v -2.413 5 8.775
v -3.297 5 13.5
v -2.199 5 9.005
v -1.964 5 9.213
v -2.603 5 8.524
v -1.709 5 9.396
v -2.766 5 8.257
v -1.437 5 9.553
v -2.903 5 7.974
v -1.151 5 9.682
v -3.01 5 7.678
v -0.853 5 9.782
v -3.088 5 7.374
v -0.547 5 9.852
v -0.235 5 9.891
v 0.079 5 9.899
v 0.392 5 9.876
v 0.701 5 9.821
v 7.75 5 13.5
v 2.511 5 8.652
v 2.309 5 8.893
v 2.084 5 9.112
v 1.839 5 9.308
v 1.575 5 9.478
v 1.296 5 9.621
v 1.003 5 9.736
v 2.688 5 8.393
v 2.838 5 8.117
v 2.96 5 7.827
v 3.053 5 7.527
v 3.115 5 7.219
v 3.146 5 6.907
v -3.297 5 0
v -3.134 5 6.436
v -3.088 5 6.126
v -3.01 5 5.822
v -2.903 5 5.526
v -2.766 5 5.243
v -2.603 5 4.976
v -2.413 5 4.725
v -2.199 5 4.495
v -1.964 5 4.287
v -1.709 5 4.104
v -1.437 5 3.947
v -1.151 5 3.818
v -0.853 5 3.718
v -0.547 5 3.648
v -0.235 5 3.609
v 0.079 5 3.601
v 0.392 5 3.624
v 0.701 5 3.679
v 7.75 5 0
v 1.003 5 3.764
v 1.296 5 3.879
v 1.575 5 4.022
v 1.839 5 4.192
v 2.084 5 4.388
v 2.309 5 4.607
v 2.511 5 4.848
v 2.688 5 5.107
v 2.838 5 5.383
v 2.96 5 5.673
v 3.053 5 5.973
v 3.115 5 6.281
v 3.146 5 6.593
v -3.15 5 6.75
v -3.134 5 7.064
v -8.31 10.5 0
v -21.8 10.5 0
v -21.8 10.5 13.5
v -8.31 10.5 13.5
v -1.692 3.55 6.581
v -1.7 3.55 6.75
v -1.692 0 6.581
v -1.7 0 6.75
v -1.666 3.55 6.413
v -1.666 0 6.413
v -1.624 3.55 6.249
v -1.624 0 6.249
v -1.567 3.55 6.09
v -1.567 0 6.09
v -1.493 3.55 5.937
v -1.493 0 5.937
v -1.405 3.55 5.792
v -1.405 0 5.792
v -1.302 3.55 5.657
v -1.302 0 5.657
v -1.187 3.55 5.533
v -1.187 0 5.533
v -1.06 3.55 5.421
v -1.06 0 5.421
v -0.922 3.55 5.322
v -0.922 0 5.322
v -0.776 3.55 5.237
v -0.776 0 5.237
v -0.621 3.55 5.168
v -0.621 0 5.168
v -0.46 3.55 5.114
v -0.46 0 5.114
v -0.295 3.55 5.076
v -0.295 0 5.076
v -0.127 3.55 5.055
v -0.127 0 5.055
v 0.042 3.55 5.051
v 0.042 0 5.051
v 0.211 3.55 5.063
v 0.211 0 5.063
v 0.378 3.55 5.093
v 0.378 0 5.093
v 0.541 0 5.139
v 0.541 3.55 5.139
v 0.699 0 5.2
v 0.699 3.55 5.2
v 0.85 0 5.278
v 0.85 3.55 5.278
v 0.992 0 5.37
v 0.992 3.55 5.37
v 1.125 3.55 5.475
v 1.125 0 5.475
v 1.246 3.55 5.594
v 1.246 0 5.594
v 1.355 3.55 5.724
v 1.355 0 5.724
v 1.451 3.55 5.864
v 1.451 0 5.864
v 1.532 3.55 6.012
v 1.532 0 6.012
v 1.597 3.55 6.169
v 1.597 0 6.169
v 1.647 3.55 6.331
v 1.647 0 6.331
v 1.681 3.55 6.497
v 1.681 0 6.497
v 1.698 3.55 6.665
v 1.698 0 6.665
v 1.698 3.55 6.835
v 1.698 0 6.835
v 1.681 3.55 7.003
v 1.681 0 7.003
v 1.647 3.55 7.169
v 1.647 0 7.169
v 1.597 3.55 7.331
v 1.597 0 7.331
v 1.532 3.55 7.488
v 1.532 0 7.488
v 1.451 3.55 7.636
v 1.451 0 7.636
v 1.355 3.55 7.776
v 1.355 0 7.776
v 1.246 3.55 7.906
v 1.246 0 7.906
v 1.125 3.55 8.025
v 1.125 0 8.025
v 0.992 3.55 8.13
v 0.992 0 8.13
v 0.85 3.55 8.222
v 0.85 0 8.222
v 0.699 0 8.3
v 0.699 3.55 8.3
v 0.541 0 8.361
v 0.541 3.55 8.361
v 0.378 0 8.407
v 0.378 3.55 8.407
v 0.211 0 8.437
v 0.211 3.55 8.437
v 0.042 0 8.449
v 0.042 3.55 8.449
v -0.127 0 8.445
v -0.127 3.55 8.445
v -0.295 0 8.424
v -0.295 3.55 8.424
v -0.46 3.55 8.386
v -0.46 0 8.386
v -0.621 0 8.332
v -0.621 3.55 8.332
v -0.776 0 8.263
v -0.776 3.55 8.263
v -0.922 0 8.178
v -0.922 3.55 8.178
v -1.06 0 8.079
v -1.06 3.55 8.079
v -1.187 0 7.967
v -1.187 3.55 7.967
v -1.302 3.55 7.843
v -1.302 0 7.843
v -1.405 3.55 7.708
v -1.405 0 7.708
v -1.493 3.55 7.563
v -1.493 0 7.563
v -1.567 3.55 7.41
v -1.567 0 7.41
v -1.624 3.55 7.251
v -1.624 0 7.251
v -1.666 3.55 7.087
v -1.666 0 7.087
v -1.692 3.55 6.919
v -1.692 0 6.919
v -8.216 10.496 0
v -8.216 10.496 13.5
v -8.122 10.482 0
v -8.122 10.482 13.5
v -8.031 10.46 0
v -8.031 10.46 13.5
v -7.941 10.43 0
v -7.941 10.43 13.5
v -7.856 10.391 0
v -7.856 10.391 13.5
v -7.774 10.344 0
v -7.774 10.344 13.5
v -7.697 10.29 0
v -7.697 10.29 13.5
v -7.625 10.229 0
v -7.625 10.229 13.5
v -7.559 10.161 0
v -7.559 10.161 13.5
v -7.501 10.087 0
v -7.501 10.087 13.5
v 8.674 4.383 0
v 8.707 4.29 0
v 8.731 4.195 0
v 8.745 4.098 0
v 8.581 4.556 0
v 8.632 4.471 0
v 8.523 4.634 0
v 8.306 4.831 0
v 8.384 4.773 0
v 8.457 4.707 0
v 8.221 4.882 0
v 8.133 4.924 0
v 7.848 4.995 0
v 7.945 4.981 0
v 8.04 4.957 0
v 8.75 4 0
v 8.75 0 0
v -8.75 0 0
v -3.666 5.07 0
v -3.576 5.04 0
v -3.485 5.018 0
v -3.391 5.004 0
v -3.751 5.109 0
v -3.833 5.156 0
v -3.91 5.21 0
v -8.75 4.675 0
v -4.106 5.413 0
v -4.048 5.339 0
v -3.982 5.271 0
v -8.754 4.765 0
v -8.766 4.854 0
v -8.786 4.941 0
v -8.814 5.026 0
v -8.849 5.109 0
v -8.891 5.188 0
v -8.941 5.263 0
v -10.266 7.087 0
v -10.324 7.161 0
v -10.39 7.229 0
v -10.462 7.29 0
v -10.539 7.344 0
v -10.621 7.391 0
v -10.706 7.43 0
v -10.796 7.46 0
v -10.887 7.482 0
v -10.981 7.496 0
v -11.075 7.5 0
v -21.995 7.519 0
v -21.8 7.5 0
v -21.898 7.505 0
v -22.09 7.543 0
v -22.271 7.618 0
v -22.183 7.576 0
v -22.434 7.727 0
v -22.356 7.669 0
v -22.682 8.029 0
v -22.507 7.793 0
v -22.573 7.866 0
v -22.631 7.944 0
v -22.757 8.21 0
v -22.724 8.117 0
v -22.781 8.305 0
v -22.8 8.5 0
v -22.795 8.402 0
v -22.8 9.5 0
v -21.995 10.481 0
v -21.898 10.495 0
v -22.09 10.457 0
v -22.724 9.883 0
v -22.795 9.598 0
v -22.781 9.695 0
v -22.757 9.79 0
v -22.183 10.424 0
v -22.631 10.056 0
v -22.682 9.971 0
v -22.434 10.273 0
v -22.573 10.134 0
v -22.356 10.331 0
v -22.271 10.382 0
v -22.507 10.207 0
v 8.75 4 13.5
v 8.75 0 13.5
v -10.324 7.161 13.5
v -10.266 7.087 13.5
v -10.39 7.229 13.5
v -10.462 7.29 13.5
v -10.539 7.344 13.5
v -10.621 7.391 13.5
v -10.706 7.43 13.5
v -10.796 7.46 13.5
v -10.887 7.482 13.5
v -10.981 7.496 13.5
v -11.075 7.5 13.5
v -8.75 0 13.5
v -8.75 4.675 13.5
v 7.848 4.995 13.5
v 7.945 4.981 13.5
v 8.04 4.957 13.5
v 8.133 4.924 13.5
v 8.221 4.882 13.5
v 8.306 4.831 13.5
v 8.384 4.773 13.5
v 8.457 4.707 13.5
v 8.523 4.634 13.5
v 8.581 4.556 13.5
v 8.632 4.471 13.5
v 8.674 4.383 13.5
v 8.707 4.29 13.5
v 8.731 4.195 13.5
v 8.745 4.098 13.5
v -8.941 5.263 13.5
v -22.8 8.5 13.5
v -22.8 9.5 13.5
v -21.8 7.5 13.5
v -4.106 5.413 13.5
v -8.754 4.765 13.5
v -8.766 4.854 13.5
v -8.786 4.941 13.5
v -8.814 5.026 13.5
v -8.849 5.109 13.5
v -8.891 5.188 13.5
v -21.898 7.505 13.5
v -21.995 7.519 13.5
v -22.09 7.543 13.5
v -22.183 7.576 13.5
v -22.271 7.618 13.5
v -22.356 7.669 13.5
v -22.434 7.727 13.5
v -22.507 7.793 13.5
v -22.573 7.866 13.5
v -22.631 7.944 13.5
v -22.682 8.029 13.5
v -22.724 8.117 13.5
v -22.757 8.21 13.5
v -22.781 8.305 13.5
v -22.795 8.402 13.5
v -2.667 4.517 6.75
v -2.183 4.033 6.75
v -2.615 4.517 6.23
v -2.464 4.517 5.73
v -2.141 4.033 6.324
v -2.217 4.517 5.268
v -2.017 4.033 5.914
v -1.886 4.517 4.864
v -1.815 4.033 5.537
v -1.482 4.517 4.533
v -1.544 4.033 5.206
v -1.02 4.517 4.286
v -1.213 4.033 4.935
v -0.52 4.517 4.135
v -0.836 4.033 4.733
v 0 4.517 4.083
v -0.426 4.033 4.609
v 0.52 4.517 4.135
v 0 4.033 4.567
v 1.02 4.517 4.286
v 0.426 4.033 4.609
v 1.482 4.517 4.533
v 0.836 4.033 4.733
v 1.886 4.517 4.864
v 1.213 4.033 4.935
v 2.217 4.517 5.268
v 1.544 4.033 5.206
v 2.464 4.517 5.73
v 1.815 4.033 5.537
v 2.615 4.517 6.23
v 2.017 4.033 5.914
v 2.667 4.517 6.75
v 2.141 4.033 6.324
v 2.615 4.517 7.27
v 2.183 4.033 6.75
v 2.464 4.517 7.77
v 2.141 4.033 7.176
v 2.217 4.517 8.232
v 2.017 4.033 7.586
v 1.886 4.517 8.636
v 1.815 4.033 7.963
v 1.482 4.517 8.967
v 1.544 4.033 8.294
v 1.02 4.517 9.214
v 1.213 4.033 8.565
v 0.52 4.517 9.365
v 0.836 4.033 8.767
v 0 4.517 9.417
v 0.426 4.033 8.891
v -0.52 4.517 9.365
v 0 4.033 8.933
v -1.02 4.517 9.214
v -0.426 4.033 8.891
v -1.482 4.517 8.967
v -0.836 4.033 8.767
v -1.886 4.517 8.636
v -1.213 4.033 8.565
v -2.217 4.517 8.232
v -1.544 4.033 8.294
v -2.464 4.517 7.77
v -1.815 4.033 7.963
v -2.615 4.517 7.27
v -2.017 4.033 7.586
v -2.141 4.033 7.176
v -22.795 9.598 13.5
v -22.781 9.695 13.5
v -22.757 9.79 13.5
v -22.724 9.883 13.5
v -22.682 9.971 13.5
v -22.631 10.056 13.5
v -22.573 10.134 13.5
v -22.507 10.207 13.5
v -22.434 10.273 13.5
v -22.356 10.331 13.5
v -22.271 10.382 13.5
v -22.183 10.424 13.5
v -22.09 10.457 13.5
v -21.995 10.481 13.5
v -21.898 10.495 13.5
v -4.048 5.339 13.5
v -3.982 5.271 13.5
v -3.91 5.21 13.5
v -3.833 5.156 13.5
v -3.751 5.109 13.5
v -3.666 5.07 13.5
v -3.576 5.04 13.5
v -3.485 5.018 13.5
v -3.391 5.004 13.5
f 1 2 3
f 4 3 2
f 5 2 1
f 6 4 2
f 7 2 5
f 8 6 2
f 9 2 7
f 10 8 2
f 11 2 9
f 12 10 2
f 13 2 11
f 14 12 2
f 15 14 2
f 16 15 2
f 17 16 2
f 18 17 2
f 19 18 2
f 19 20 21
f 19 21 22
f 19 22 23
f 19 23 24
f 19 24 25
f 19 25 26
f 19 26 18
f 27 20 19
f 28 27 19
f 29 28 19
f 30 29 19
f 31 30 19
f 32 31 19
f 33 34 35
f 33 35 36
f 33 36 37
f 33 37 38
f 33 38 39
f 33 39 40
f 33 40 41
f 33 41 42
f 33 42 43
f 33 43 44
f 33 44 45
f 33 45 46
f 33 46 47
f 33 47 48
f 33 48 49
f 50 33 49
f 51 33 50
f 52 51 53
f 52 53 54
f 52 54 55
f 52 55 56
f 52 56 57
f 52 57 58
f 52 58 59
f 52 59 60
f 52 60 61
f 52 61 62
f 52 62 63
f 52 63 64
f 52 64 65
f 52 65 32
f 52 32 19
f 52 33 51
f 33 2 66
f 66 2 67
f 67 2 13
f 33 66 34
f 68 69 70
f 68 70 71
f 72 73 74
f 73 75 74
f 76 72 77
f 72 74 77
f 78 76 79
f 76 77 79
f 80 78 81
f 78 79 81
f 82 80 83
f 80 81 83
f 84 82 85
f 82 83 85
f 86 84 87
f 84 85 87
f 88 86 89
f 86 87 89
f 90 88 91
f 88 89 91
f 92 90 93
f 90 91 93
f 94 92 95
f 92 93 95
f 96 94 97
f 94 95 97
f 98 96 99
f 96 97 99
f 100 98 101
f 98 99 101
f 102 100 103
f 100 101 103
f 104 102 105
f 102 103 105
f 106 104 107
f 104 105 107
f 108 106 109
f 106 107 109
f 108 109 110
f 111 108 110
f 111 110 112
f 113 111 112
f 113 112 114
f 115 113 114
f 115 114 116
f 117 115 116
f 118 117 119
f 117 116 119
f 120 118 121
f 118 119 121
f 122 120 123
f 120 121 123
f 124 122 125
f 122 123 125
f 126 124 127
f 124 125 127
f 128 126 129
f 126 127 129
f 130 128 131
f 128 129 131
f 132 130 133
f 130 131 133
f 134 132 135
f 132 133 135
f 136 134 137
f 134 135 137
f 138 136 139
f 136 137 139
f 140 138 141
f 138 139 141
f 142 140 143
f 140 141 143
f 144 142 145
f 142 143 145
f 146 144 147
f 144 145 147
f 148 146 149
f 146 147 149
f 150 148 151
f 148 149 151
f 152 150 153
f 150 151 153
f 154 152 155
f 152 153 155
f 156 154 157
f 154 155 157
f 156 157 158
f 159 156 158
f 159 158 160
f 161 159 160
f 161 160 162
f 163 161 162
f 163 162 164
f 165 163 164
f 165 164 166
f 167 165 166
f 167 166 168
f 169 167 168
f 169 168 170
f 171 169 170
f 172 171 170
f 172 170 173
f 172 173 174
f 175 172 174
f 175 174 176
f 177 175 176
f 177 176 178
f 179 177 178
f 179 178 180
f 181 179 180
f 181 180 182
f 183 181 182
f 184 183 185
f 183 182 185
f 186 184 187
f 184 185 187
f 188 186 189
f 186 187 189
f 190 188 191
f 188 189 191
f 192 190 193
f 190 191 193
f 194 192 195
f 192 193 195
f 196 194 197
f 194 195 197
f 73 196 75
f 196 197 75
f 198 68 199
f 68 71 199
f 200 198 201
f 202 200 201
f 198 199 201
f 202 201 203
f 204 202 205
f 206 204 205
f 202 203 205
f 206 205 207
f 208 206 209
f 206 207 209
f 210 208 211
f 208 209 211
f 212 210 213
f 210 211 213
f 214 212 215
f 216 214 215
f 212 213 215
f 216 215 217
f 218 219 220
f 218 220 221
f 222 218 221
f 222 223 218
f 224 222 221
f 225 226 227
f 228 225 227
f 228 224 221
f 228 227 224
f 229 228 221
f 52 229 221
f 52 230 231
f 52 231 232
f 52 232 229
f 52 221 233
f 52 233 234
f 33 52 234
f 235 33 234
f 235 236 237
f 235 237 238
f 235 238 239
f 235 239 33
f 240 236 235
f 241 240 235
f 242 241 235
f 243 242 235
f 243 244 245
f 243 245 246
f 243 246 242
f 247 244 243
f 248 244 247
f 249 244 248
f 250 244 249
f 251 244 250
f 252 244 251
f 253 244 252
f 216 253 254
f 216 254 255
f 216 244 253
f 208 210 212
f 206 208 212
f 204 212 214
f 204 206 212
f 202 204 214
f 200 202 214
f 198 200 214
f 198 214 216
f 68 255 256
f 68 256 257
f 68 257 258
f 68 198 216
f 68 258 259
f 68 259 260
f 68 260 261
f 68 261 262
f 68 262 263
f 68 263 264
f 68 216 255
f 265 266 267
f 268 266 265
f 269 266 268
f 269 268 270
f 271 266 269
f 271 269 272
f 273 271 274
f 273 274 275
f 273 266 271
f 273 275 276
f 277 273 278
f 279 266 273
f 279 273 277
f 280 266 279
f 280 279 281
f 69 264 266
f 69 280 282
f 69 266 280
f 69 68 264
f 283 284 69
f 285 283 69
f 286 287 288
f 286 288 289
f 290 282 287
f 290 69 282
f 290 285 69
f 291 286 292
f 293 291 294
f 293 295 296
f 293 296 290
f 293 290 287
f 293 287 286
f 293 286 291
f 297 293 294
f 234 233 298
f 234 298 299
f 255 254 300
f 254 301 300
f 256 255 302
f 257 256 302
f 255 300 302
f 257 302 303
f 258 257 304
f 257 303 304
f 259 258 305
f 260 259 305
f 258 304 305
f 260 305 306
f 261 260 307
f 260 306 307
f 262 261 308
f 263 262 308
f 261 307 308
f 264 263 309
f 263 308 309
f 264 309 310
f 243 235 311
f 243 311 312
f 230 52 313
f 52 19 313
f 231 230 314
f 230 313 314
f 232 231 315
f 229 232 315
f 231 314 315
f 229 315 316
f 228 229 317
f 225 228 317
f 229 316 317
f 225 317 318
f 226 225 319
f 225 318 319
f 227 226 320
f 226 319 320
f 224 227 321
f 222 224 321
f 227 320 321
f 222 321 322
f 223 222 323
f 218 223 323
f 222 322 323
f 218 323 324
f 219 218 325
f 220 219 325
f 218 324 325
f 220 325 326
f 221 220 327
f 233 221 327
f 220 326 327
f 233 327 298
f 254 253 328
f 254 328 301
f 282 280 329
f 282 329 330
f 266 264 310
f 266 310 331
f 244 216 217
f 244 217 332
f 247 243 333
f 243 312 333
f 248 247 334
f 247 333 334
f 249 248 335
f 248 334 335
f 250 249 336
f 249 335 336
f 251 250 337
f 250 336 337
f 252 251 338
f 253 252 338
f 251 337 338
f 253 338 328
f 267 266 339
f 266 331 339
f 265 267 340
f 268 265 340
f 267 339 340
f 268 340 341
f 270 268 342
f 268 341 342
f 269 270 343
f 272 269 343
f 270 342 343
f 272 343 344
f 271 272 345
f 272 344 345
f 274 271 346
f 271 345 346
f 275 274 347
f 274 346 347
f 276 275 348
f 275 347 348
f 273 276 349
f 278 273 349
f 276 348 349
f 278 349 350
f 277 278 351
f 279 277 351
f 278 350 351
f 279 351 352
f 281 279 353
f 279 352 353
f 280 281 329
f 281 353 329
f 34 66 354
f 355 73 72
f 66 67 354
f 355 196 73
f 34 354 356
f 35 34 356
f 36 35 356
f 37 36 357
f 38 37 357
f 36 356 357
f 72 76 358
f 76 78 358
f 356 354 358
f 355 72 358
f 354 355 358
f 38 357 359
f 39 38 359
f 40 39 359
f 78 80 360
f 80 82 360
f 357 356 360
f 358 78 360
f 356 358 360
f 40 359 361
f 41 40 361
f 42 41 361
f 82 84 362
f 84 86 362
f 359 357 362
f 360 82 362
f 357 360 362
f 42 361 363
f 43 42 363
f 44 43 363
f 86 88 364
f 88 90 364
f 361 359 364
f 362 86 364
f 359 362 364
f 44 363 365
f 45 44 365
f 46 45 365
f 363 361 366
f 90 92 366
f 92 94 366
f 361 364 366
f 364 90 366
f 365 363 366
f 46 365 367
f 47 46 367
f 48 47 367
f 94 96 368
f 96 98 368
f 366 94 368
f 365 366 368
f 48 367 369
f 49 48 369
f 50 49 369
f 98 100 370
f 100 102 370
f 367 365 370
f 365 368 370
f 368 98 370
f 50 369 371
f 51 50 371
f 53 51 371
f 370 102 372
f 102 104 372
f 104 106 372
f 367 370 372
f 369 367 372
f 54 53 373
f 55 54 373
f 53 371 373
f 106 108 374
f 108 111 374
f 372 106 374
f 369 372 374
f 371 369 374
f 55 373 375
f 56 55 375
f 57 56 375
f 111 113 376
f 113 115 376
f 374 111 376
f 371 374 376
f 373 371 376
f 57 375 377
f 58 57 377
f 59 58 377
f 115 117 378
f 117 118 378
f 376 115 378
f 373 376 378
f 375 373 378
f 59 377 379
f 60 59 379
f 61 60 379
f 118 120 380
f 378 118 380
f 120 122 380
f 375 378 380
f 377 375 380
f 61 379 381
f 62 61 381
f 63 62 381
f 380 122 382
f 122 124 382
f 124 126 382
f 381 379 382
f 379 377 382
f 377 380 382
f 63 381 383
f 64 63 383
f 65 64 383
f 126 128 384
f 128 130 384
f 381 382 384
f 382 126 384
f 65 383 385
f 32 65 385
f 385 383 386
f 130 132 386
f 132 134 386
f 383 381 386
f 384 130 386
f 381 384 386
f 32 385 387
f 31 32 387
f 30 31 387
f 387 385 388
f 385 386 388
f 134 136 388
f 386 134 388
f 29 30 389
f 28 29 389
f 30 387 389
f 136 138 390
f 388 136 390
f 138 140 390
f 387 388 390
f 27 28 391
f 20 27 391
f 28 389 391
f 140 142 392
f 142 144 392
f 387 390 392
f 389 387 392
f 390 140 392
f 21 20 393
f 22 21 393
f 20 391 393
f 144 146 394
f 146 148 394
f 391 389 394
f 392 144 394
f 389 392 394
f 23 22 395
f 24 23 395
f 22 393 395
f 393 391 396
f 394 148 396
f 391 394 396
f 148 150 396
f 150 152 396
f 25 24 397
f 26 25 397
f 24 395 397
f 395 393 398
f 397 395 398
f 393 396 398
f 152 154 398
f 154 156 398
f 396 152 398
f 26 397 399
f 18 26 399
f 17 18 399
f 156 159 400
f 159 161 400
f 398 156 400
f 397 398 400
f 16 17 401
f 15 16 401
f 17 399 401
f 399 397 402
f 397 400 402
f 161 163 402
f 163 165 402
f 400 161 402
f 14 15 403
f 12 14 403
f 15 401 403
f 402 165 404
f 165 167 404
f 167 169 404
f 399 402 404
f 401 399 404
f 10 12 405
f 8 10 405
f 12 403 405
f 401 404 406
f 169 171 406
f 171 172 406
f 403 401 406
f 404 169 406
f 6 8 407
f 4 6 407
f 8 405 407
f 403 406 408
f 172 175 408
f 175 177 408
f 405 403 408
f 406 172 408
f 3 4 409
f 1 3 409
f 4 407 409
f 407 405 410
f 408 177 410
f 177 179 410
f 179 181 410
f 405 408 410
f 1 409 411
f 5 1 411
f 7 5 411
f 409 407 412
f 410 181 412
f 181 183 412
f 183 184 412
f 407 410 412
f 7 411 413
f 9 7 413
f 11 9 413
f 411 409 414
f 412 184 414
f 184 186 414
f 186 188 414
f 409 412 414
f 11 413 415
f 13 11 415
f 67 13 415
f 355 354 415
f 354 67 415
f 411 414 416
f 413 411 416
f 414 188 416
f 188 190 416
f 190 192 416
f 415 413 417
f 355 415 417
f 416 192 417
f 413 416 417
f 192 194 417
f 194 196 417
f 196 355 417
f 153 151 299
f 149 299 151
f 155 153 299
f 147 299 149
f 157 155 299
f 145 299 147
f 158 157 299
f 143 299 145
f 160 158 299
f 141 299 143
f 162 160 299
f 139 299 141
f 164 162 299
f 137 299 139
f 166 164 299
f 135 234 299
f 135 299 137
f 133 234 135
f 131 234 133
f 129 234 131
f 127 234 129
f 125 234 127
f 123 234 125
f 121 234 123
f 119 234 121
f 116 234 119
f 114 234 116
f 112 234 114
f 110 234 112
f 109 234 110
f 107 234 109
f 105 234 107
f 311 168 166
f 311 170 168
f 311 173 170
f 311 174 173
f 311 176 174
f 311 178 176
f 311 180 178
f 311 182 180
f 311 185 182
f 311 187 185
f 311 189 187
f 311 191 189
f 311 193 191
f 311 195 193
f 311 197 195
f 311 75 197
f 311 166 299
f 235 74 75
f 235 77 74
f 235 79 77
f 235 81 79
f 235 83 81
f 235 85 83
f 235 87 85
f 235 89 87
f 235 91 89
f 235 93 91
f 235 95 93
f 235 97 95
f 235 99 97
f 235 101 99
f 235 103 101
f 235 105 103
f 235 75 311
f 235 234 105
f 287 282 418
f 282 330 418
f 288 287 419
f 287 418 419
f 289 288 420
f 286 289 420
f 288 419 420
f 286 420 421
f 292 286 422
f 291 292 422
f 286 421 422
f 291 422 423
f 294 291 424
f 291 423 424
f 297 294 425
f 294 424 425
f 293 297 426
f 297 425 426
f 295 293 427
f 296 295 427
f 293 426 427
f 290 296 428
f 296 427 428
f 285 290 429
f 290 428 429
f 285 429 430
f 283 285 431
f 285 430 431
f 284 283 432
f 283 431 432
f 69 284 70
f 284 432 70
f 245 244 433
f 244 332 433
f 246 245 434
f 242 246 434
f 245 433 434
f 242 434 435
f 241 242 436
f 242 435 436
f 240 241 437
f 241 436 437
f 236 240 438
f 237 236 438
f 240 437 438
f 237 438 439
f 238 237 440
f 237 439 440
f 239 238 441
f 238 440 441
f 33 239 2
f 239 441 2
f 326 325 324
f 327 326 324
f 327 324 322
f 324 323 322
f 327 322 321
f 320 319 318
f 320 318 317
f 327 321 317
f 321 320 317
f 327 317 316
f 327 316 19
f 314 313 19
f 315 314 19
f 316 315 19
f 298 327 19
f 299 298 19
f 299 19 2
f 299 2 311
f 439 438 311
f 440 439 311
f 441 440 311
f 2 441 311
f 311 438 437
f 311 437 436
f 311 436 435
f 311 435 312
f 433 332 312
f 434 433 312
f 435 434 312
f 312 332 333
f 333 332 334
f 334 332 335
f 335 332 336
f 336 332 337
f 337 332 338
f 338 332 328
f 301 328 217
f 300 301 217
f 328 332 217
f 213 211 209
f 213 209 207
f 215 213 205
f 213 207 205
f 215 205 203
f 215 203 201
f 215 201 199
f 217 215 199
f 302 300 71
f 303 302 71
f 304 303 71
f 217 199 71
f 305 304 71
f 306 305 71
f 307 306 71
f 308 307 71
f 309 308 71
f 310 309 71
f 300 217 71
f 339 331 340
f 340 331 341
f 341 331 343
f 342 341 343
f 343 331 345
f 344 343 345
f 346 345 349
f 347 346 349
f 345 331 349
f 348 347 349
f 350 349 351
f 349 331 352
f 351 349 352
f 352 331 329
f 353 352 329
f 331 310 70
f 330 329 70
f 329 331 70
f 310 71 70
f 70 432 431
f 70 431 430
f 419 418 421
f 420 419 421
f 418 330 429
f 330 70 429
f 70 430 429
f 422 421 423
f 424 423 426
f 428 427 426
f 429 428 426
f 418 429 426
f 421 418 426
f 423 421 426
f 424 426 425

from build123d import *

# Parameters (mm, degrees)
EXTRUDE_442_DEPTH          = 13.5
FILLET_1_R                 = 1
HOLE_WIZARD_M3_D           = 3.4
HOLE_WIZARD_M3_CSINK_D     = 6.3
HOLE_WIZARD_M3_CSINK_ANGLE = 90


with BuildPart() as part:
    # Эскиз1 → Extrude 442 (new body)
    with BuildSketch(Plane.XY):
        Polygon((8.75, 0), (-8.75, 0), (-8.75, 5), (-10.564997351, 7.5), (-22.8, 7.5), (-22.8, 10.5), (-7.8, 10.5), (-3.807005828, 5), (8.75, 5), align=None)
    extrude(amount=EXTRUDE_442_DEPTH)

    # Скругление1
    fillet_1_edges = [part.edges().sort_by_distance(p)[0] for p in [
        (-8.75, 5, 6.75),
        (-10.564997351, 7.5, 6.75),
        (-22.8, 7.5, 6.75),
        (-22.8, 10.5, 6.75),
        (-7.8, 10.5, 6.75),
        (-3.807005828, 5, 6.75),
        (8.75, 5, 6.75),
    ]]
    fillet(fillet_1_edges, radius=FILLET_1_R)

    # Крепление-M3 (through all)
    with Locations(Plane(origin=(0, 5, 0), x_dir=(1, 0, 0), z_dir=(0, 1, 0))):
        with Locations((0, -6.75)):
            CounterSinkHole(HOLE_WIZARD_M3_D / 2, HOLE_WIZARD_M3_CSINK_D / 2, counter_sink_angle=HOLE_WIZARD_M3_CSINK_ANGLE)


solid = part.part
